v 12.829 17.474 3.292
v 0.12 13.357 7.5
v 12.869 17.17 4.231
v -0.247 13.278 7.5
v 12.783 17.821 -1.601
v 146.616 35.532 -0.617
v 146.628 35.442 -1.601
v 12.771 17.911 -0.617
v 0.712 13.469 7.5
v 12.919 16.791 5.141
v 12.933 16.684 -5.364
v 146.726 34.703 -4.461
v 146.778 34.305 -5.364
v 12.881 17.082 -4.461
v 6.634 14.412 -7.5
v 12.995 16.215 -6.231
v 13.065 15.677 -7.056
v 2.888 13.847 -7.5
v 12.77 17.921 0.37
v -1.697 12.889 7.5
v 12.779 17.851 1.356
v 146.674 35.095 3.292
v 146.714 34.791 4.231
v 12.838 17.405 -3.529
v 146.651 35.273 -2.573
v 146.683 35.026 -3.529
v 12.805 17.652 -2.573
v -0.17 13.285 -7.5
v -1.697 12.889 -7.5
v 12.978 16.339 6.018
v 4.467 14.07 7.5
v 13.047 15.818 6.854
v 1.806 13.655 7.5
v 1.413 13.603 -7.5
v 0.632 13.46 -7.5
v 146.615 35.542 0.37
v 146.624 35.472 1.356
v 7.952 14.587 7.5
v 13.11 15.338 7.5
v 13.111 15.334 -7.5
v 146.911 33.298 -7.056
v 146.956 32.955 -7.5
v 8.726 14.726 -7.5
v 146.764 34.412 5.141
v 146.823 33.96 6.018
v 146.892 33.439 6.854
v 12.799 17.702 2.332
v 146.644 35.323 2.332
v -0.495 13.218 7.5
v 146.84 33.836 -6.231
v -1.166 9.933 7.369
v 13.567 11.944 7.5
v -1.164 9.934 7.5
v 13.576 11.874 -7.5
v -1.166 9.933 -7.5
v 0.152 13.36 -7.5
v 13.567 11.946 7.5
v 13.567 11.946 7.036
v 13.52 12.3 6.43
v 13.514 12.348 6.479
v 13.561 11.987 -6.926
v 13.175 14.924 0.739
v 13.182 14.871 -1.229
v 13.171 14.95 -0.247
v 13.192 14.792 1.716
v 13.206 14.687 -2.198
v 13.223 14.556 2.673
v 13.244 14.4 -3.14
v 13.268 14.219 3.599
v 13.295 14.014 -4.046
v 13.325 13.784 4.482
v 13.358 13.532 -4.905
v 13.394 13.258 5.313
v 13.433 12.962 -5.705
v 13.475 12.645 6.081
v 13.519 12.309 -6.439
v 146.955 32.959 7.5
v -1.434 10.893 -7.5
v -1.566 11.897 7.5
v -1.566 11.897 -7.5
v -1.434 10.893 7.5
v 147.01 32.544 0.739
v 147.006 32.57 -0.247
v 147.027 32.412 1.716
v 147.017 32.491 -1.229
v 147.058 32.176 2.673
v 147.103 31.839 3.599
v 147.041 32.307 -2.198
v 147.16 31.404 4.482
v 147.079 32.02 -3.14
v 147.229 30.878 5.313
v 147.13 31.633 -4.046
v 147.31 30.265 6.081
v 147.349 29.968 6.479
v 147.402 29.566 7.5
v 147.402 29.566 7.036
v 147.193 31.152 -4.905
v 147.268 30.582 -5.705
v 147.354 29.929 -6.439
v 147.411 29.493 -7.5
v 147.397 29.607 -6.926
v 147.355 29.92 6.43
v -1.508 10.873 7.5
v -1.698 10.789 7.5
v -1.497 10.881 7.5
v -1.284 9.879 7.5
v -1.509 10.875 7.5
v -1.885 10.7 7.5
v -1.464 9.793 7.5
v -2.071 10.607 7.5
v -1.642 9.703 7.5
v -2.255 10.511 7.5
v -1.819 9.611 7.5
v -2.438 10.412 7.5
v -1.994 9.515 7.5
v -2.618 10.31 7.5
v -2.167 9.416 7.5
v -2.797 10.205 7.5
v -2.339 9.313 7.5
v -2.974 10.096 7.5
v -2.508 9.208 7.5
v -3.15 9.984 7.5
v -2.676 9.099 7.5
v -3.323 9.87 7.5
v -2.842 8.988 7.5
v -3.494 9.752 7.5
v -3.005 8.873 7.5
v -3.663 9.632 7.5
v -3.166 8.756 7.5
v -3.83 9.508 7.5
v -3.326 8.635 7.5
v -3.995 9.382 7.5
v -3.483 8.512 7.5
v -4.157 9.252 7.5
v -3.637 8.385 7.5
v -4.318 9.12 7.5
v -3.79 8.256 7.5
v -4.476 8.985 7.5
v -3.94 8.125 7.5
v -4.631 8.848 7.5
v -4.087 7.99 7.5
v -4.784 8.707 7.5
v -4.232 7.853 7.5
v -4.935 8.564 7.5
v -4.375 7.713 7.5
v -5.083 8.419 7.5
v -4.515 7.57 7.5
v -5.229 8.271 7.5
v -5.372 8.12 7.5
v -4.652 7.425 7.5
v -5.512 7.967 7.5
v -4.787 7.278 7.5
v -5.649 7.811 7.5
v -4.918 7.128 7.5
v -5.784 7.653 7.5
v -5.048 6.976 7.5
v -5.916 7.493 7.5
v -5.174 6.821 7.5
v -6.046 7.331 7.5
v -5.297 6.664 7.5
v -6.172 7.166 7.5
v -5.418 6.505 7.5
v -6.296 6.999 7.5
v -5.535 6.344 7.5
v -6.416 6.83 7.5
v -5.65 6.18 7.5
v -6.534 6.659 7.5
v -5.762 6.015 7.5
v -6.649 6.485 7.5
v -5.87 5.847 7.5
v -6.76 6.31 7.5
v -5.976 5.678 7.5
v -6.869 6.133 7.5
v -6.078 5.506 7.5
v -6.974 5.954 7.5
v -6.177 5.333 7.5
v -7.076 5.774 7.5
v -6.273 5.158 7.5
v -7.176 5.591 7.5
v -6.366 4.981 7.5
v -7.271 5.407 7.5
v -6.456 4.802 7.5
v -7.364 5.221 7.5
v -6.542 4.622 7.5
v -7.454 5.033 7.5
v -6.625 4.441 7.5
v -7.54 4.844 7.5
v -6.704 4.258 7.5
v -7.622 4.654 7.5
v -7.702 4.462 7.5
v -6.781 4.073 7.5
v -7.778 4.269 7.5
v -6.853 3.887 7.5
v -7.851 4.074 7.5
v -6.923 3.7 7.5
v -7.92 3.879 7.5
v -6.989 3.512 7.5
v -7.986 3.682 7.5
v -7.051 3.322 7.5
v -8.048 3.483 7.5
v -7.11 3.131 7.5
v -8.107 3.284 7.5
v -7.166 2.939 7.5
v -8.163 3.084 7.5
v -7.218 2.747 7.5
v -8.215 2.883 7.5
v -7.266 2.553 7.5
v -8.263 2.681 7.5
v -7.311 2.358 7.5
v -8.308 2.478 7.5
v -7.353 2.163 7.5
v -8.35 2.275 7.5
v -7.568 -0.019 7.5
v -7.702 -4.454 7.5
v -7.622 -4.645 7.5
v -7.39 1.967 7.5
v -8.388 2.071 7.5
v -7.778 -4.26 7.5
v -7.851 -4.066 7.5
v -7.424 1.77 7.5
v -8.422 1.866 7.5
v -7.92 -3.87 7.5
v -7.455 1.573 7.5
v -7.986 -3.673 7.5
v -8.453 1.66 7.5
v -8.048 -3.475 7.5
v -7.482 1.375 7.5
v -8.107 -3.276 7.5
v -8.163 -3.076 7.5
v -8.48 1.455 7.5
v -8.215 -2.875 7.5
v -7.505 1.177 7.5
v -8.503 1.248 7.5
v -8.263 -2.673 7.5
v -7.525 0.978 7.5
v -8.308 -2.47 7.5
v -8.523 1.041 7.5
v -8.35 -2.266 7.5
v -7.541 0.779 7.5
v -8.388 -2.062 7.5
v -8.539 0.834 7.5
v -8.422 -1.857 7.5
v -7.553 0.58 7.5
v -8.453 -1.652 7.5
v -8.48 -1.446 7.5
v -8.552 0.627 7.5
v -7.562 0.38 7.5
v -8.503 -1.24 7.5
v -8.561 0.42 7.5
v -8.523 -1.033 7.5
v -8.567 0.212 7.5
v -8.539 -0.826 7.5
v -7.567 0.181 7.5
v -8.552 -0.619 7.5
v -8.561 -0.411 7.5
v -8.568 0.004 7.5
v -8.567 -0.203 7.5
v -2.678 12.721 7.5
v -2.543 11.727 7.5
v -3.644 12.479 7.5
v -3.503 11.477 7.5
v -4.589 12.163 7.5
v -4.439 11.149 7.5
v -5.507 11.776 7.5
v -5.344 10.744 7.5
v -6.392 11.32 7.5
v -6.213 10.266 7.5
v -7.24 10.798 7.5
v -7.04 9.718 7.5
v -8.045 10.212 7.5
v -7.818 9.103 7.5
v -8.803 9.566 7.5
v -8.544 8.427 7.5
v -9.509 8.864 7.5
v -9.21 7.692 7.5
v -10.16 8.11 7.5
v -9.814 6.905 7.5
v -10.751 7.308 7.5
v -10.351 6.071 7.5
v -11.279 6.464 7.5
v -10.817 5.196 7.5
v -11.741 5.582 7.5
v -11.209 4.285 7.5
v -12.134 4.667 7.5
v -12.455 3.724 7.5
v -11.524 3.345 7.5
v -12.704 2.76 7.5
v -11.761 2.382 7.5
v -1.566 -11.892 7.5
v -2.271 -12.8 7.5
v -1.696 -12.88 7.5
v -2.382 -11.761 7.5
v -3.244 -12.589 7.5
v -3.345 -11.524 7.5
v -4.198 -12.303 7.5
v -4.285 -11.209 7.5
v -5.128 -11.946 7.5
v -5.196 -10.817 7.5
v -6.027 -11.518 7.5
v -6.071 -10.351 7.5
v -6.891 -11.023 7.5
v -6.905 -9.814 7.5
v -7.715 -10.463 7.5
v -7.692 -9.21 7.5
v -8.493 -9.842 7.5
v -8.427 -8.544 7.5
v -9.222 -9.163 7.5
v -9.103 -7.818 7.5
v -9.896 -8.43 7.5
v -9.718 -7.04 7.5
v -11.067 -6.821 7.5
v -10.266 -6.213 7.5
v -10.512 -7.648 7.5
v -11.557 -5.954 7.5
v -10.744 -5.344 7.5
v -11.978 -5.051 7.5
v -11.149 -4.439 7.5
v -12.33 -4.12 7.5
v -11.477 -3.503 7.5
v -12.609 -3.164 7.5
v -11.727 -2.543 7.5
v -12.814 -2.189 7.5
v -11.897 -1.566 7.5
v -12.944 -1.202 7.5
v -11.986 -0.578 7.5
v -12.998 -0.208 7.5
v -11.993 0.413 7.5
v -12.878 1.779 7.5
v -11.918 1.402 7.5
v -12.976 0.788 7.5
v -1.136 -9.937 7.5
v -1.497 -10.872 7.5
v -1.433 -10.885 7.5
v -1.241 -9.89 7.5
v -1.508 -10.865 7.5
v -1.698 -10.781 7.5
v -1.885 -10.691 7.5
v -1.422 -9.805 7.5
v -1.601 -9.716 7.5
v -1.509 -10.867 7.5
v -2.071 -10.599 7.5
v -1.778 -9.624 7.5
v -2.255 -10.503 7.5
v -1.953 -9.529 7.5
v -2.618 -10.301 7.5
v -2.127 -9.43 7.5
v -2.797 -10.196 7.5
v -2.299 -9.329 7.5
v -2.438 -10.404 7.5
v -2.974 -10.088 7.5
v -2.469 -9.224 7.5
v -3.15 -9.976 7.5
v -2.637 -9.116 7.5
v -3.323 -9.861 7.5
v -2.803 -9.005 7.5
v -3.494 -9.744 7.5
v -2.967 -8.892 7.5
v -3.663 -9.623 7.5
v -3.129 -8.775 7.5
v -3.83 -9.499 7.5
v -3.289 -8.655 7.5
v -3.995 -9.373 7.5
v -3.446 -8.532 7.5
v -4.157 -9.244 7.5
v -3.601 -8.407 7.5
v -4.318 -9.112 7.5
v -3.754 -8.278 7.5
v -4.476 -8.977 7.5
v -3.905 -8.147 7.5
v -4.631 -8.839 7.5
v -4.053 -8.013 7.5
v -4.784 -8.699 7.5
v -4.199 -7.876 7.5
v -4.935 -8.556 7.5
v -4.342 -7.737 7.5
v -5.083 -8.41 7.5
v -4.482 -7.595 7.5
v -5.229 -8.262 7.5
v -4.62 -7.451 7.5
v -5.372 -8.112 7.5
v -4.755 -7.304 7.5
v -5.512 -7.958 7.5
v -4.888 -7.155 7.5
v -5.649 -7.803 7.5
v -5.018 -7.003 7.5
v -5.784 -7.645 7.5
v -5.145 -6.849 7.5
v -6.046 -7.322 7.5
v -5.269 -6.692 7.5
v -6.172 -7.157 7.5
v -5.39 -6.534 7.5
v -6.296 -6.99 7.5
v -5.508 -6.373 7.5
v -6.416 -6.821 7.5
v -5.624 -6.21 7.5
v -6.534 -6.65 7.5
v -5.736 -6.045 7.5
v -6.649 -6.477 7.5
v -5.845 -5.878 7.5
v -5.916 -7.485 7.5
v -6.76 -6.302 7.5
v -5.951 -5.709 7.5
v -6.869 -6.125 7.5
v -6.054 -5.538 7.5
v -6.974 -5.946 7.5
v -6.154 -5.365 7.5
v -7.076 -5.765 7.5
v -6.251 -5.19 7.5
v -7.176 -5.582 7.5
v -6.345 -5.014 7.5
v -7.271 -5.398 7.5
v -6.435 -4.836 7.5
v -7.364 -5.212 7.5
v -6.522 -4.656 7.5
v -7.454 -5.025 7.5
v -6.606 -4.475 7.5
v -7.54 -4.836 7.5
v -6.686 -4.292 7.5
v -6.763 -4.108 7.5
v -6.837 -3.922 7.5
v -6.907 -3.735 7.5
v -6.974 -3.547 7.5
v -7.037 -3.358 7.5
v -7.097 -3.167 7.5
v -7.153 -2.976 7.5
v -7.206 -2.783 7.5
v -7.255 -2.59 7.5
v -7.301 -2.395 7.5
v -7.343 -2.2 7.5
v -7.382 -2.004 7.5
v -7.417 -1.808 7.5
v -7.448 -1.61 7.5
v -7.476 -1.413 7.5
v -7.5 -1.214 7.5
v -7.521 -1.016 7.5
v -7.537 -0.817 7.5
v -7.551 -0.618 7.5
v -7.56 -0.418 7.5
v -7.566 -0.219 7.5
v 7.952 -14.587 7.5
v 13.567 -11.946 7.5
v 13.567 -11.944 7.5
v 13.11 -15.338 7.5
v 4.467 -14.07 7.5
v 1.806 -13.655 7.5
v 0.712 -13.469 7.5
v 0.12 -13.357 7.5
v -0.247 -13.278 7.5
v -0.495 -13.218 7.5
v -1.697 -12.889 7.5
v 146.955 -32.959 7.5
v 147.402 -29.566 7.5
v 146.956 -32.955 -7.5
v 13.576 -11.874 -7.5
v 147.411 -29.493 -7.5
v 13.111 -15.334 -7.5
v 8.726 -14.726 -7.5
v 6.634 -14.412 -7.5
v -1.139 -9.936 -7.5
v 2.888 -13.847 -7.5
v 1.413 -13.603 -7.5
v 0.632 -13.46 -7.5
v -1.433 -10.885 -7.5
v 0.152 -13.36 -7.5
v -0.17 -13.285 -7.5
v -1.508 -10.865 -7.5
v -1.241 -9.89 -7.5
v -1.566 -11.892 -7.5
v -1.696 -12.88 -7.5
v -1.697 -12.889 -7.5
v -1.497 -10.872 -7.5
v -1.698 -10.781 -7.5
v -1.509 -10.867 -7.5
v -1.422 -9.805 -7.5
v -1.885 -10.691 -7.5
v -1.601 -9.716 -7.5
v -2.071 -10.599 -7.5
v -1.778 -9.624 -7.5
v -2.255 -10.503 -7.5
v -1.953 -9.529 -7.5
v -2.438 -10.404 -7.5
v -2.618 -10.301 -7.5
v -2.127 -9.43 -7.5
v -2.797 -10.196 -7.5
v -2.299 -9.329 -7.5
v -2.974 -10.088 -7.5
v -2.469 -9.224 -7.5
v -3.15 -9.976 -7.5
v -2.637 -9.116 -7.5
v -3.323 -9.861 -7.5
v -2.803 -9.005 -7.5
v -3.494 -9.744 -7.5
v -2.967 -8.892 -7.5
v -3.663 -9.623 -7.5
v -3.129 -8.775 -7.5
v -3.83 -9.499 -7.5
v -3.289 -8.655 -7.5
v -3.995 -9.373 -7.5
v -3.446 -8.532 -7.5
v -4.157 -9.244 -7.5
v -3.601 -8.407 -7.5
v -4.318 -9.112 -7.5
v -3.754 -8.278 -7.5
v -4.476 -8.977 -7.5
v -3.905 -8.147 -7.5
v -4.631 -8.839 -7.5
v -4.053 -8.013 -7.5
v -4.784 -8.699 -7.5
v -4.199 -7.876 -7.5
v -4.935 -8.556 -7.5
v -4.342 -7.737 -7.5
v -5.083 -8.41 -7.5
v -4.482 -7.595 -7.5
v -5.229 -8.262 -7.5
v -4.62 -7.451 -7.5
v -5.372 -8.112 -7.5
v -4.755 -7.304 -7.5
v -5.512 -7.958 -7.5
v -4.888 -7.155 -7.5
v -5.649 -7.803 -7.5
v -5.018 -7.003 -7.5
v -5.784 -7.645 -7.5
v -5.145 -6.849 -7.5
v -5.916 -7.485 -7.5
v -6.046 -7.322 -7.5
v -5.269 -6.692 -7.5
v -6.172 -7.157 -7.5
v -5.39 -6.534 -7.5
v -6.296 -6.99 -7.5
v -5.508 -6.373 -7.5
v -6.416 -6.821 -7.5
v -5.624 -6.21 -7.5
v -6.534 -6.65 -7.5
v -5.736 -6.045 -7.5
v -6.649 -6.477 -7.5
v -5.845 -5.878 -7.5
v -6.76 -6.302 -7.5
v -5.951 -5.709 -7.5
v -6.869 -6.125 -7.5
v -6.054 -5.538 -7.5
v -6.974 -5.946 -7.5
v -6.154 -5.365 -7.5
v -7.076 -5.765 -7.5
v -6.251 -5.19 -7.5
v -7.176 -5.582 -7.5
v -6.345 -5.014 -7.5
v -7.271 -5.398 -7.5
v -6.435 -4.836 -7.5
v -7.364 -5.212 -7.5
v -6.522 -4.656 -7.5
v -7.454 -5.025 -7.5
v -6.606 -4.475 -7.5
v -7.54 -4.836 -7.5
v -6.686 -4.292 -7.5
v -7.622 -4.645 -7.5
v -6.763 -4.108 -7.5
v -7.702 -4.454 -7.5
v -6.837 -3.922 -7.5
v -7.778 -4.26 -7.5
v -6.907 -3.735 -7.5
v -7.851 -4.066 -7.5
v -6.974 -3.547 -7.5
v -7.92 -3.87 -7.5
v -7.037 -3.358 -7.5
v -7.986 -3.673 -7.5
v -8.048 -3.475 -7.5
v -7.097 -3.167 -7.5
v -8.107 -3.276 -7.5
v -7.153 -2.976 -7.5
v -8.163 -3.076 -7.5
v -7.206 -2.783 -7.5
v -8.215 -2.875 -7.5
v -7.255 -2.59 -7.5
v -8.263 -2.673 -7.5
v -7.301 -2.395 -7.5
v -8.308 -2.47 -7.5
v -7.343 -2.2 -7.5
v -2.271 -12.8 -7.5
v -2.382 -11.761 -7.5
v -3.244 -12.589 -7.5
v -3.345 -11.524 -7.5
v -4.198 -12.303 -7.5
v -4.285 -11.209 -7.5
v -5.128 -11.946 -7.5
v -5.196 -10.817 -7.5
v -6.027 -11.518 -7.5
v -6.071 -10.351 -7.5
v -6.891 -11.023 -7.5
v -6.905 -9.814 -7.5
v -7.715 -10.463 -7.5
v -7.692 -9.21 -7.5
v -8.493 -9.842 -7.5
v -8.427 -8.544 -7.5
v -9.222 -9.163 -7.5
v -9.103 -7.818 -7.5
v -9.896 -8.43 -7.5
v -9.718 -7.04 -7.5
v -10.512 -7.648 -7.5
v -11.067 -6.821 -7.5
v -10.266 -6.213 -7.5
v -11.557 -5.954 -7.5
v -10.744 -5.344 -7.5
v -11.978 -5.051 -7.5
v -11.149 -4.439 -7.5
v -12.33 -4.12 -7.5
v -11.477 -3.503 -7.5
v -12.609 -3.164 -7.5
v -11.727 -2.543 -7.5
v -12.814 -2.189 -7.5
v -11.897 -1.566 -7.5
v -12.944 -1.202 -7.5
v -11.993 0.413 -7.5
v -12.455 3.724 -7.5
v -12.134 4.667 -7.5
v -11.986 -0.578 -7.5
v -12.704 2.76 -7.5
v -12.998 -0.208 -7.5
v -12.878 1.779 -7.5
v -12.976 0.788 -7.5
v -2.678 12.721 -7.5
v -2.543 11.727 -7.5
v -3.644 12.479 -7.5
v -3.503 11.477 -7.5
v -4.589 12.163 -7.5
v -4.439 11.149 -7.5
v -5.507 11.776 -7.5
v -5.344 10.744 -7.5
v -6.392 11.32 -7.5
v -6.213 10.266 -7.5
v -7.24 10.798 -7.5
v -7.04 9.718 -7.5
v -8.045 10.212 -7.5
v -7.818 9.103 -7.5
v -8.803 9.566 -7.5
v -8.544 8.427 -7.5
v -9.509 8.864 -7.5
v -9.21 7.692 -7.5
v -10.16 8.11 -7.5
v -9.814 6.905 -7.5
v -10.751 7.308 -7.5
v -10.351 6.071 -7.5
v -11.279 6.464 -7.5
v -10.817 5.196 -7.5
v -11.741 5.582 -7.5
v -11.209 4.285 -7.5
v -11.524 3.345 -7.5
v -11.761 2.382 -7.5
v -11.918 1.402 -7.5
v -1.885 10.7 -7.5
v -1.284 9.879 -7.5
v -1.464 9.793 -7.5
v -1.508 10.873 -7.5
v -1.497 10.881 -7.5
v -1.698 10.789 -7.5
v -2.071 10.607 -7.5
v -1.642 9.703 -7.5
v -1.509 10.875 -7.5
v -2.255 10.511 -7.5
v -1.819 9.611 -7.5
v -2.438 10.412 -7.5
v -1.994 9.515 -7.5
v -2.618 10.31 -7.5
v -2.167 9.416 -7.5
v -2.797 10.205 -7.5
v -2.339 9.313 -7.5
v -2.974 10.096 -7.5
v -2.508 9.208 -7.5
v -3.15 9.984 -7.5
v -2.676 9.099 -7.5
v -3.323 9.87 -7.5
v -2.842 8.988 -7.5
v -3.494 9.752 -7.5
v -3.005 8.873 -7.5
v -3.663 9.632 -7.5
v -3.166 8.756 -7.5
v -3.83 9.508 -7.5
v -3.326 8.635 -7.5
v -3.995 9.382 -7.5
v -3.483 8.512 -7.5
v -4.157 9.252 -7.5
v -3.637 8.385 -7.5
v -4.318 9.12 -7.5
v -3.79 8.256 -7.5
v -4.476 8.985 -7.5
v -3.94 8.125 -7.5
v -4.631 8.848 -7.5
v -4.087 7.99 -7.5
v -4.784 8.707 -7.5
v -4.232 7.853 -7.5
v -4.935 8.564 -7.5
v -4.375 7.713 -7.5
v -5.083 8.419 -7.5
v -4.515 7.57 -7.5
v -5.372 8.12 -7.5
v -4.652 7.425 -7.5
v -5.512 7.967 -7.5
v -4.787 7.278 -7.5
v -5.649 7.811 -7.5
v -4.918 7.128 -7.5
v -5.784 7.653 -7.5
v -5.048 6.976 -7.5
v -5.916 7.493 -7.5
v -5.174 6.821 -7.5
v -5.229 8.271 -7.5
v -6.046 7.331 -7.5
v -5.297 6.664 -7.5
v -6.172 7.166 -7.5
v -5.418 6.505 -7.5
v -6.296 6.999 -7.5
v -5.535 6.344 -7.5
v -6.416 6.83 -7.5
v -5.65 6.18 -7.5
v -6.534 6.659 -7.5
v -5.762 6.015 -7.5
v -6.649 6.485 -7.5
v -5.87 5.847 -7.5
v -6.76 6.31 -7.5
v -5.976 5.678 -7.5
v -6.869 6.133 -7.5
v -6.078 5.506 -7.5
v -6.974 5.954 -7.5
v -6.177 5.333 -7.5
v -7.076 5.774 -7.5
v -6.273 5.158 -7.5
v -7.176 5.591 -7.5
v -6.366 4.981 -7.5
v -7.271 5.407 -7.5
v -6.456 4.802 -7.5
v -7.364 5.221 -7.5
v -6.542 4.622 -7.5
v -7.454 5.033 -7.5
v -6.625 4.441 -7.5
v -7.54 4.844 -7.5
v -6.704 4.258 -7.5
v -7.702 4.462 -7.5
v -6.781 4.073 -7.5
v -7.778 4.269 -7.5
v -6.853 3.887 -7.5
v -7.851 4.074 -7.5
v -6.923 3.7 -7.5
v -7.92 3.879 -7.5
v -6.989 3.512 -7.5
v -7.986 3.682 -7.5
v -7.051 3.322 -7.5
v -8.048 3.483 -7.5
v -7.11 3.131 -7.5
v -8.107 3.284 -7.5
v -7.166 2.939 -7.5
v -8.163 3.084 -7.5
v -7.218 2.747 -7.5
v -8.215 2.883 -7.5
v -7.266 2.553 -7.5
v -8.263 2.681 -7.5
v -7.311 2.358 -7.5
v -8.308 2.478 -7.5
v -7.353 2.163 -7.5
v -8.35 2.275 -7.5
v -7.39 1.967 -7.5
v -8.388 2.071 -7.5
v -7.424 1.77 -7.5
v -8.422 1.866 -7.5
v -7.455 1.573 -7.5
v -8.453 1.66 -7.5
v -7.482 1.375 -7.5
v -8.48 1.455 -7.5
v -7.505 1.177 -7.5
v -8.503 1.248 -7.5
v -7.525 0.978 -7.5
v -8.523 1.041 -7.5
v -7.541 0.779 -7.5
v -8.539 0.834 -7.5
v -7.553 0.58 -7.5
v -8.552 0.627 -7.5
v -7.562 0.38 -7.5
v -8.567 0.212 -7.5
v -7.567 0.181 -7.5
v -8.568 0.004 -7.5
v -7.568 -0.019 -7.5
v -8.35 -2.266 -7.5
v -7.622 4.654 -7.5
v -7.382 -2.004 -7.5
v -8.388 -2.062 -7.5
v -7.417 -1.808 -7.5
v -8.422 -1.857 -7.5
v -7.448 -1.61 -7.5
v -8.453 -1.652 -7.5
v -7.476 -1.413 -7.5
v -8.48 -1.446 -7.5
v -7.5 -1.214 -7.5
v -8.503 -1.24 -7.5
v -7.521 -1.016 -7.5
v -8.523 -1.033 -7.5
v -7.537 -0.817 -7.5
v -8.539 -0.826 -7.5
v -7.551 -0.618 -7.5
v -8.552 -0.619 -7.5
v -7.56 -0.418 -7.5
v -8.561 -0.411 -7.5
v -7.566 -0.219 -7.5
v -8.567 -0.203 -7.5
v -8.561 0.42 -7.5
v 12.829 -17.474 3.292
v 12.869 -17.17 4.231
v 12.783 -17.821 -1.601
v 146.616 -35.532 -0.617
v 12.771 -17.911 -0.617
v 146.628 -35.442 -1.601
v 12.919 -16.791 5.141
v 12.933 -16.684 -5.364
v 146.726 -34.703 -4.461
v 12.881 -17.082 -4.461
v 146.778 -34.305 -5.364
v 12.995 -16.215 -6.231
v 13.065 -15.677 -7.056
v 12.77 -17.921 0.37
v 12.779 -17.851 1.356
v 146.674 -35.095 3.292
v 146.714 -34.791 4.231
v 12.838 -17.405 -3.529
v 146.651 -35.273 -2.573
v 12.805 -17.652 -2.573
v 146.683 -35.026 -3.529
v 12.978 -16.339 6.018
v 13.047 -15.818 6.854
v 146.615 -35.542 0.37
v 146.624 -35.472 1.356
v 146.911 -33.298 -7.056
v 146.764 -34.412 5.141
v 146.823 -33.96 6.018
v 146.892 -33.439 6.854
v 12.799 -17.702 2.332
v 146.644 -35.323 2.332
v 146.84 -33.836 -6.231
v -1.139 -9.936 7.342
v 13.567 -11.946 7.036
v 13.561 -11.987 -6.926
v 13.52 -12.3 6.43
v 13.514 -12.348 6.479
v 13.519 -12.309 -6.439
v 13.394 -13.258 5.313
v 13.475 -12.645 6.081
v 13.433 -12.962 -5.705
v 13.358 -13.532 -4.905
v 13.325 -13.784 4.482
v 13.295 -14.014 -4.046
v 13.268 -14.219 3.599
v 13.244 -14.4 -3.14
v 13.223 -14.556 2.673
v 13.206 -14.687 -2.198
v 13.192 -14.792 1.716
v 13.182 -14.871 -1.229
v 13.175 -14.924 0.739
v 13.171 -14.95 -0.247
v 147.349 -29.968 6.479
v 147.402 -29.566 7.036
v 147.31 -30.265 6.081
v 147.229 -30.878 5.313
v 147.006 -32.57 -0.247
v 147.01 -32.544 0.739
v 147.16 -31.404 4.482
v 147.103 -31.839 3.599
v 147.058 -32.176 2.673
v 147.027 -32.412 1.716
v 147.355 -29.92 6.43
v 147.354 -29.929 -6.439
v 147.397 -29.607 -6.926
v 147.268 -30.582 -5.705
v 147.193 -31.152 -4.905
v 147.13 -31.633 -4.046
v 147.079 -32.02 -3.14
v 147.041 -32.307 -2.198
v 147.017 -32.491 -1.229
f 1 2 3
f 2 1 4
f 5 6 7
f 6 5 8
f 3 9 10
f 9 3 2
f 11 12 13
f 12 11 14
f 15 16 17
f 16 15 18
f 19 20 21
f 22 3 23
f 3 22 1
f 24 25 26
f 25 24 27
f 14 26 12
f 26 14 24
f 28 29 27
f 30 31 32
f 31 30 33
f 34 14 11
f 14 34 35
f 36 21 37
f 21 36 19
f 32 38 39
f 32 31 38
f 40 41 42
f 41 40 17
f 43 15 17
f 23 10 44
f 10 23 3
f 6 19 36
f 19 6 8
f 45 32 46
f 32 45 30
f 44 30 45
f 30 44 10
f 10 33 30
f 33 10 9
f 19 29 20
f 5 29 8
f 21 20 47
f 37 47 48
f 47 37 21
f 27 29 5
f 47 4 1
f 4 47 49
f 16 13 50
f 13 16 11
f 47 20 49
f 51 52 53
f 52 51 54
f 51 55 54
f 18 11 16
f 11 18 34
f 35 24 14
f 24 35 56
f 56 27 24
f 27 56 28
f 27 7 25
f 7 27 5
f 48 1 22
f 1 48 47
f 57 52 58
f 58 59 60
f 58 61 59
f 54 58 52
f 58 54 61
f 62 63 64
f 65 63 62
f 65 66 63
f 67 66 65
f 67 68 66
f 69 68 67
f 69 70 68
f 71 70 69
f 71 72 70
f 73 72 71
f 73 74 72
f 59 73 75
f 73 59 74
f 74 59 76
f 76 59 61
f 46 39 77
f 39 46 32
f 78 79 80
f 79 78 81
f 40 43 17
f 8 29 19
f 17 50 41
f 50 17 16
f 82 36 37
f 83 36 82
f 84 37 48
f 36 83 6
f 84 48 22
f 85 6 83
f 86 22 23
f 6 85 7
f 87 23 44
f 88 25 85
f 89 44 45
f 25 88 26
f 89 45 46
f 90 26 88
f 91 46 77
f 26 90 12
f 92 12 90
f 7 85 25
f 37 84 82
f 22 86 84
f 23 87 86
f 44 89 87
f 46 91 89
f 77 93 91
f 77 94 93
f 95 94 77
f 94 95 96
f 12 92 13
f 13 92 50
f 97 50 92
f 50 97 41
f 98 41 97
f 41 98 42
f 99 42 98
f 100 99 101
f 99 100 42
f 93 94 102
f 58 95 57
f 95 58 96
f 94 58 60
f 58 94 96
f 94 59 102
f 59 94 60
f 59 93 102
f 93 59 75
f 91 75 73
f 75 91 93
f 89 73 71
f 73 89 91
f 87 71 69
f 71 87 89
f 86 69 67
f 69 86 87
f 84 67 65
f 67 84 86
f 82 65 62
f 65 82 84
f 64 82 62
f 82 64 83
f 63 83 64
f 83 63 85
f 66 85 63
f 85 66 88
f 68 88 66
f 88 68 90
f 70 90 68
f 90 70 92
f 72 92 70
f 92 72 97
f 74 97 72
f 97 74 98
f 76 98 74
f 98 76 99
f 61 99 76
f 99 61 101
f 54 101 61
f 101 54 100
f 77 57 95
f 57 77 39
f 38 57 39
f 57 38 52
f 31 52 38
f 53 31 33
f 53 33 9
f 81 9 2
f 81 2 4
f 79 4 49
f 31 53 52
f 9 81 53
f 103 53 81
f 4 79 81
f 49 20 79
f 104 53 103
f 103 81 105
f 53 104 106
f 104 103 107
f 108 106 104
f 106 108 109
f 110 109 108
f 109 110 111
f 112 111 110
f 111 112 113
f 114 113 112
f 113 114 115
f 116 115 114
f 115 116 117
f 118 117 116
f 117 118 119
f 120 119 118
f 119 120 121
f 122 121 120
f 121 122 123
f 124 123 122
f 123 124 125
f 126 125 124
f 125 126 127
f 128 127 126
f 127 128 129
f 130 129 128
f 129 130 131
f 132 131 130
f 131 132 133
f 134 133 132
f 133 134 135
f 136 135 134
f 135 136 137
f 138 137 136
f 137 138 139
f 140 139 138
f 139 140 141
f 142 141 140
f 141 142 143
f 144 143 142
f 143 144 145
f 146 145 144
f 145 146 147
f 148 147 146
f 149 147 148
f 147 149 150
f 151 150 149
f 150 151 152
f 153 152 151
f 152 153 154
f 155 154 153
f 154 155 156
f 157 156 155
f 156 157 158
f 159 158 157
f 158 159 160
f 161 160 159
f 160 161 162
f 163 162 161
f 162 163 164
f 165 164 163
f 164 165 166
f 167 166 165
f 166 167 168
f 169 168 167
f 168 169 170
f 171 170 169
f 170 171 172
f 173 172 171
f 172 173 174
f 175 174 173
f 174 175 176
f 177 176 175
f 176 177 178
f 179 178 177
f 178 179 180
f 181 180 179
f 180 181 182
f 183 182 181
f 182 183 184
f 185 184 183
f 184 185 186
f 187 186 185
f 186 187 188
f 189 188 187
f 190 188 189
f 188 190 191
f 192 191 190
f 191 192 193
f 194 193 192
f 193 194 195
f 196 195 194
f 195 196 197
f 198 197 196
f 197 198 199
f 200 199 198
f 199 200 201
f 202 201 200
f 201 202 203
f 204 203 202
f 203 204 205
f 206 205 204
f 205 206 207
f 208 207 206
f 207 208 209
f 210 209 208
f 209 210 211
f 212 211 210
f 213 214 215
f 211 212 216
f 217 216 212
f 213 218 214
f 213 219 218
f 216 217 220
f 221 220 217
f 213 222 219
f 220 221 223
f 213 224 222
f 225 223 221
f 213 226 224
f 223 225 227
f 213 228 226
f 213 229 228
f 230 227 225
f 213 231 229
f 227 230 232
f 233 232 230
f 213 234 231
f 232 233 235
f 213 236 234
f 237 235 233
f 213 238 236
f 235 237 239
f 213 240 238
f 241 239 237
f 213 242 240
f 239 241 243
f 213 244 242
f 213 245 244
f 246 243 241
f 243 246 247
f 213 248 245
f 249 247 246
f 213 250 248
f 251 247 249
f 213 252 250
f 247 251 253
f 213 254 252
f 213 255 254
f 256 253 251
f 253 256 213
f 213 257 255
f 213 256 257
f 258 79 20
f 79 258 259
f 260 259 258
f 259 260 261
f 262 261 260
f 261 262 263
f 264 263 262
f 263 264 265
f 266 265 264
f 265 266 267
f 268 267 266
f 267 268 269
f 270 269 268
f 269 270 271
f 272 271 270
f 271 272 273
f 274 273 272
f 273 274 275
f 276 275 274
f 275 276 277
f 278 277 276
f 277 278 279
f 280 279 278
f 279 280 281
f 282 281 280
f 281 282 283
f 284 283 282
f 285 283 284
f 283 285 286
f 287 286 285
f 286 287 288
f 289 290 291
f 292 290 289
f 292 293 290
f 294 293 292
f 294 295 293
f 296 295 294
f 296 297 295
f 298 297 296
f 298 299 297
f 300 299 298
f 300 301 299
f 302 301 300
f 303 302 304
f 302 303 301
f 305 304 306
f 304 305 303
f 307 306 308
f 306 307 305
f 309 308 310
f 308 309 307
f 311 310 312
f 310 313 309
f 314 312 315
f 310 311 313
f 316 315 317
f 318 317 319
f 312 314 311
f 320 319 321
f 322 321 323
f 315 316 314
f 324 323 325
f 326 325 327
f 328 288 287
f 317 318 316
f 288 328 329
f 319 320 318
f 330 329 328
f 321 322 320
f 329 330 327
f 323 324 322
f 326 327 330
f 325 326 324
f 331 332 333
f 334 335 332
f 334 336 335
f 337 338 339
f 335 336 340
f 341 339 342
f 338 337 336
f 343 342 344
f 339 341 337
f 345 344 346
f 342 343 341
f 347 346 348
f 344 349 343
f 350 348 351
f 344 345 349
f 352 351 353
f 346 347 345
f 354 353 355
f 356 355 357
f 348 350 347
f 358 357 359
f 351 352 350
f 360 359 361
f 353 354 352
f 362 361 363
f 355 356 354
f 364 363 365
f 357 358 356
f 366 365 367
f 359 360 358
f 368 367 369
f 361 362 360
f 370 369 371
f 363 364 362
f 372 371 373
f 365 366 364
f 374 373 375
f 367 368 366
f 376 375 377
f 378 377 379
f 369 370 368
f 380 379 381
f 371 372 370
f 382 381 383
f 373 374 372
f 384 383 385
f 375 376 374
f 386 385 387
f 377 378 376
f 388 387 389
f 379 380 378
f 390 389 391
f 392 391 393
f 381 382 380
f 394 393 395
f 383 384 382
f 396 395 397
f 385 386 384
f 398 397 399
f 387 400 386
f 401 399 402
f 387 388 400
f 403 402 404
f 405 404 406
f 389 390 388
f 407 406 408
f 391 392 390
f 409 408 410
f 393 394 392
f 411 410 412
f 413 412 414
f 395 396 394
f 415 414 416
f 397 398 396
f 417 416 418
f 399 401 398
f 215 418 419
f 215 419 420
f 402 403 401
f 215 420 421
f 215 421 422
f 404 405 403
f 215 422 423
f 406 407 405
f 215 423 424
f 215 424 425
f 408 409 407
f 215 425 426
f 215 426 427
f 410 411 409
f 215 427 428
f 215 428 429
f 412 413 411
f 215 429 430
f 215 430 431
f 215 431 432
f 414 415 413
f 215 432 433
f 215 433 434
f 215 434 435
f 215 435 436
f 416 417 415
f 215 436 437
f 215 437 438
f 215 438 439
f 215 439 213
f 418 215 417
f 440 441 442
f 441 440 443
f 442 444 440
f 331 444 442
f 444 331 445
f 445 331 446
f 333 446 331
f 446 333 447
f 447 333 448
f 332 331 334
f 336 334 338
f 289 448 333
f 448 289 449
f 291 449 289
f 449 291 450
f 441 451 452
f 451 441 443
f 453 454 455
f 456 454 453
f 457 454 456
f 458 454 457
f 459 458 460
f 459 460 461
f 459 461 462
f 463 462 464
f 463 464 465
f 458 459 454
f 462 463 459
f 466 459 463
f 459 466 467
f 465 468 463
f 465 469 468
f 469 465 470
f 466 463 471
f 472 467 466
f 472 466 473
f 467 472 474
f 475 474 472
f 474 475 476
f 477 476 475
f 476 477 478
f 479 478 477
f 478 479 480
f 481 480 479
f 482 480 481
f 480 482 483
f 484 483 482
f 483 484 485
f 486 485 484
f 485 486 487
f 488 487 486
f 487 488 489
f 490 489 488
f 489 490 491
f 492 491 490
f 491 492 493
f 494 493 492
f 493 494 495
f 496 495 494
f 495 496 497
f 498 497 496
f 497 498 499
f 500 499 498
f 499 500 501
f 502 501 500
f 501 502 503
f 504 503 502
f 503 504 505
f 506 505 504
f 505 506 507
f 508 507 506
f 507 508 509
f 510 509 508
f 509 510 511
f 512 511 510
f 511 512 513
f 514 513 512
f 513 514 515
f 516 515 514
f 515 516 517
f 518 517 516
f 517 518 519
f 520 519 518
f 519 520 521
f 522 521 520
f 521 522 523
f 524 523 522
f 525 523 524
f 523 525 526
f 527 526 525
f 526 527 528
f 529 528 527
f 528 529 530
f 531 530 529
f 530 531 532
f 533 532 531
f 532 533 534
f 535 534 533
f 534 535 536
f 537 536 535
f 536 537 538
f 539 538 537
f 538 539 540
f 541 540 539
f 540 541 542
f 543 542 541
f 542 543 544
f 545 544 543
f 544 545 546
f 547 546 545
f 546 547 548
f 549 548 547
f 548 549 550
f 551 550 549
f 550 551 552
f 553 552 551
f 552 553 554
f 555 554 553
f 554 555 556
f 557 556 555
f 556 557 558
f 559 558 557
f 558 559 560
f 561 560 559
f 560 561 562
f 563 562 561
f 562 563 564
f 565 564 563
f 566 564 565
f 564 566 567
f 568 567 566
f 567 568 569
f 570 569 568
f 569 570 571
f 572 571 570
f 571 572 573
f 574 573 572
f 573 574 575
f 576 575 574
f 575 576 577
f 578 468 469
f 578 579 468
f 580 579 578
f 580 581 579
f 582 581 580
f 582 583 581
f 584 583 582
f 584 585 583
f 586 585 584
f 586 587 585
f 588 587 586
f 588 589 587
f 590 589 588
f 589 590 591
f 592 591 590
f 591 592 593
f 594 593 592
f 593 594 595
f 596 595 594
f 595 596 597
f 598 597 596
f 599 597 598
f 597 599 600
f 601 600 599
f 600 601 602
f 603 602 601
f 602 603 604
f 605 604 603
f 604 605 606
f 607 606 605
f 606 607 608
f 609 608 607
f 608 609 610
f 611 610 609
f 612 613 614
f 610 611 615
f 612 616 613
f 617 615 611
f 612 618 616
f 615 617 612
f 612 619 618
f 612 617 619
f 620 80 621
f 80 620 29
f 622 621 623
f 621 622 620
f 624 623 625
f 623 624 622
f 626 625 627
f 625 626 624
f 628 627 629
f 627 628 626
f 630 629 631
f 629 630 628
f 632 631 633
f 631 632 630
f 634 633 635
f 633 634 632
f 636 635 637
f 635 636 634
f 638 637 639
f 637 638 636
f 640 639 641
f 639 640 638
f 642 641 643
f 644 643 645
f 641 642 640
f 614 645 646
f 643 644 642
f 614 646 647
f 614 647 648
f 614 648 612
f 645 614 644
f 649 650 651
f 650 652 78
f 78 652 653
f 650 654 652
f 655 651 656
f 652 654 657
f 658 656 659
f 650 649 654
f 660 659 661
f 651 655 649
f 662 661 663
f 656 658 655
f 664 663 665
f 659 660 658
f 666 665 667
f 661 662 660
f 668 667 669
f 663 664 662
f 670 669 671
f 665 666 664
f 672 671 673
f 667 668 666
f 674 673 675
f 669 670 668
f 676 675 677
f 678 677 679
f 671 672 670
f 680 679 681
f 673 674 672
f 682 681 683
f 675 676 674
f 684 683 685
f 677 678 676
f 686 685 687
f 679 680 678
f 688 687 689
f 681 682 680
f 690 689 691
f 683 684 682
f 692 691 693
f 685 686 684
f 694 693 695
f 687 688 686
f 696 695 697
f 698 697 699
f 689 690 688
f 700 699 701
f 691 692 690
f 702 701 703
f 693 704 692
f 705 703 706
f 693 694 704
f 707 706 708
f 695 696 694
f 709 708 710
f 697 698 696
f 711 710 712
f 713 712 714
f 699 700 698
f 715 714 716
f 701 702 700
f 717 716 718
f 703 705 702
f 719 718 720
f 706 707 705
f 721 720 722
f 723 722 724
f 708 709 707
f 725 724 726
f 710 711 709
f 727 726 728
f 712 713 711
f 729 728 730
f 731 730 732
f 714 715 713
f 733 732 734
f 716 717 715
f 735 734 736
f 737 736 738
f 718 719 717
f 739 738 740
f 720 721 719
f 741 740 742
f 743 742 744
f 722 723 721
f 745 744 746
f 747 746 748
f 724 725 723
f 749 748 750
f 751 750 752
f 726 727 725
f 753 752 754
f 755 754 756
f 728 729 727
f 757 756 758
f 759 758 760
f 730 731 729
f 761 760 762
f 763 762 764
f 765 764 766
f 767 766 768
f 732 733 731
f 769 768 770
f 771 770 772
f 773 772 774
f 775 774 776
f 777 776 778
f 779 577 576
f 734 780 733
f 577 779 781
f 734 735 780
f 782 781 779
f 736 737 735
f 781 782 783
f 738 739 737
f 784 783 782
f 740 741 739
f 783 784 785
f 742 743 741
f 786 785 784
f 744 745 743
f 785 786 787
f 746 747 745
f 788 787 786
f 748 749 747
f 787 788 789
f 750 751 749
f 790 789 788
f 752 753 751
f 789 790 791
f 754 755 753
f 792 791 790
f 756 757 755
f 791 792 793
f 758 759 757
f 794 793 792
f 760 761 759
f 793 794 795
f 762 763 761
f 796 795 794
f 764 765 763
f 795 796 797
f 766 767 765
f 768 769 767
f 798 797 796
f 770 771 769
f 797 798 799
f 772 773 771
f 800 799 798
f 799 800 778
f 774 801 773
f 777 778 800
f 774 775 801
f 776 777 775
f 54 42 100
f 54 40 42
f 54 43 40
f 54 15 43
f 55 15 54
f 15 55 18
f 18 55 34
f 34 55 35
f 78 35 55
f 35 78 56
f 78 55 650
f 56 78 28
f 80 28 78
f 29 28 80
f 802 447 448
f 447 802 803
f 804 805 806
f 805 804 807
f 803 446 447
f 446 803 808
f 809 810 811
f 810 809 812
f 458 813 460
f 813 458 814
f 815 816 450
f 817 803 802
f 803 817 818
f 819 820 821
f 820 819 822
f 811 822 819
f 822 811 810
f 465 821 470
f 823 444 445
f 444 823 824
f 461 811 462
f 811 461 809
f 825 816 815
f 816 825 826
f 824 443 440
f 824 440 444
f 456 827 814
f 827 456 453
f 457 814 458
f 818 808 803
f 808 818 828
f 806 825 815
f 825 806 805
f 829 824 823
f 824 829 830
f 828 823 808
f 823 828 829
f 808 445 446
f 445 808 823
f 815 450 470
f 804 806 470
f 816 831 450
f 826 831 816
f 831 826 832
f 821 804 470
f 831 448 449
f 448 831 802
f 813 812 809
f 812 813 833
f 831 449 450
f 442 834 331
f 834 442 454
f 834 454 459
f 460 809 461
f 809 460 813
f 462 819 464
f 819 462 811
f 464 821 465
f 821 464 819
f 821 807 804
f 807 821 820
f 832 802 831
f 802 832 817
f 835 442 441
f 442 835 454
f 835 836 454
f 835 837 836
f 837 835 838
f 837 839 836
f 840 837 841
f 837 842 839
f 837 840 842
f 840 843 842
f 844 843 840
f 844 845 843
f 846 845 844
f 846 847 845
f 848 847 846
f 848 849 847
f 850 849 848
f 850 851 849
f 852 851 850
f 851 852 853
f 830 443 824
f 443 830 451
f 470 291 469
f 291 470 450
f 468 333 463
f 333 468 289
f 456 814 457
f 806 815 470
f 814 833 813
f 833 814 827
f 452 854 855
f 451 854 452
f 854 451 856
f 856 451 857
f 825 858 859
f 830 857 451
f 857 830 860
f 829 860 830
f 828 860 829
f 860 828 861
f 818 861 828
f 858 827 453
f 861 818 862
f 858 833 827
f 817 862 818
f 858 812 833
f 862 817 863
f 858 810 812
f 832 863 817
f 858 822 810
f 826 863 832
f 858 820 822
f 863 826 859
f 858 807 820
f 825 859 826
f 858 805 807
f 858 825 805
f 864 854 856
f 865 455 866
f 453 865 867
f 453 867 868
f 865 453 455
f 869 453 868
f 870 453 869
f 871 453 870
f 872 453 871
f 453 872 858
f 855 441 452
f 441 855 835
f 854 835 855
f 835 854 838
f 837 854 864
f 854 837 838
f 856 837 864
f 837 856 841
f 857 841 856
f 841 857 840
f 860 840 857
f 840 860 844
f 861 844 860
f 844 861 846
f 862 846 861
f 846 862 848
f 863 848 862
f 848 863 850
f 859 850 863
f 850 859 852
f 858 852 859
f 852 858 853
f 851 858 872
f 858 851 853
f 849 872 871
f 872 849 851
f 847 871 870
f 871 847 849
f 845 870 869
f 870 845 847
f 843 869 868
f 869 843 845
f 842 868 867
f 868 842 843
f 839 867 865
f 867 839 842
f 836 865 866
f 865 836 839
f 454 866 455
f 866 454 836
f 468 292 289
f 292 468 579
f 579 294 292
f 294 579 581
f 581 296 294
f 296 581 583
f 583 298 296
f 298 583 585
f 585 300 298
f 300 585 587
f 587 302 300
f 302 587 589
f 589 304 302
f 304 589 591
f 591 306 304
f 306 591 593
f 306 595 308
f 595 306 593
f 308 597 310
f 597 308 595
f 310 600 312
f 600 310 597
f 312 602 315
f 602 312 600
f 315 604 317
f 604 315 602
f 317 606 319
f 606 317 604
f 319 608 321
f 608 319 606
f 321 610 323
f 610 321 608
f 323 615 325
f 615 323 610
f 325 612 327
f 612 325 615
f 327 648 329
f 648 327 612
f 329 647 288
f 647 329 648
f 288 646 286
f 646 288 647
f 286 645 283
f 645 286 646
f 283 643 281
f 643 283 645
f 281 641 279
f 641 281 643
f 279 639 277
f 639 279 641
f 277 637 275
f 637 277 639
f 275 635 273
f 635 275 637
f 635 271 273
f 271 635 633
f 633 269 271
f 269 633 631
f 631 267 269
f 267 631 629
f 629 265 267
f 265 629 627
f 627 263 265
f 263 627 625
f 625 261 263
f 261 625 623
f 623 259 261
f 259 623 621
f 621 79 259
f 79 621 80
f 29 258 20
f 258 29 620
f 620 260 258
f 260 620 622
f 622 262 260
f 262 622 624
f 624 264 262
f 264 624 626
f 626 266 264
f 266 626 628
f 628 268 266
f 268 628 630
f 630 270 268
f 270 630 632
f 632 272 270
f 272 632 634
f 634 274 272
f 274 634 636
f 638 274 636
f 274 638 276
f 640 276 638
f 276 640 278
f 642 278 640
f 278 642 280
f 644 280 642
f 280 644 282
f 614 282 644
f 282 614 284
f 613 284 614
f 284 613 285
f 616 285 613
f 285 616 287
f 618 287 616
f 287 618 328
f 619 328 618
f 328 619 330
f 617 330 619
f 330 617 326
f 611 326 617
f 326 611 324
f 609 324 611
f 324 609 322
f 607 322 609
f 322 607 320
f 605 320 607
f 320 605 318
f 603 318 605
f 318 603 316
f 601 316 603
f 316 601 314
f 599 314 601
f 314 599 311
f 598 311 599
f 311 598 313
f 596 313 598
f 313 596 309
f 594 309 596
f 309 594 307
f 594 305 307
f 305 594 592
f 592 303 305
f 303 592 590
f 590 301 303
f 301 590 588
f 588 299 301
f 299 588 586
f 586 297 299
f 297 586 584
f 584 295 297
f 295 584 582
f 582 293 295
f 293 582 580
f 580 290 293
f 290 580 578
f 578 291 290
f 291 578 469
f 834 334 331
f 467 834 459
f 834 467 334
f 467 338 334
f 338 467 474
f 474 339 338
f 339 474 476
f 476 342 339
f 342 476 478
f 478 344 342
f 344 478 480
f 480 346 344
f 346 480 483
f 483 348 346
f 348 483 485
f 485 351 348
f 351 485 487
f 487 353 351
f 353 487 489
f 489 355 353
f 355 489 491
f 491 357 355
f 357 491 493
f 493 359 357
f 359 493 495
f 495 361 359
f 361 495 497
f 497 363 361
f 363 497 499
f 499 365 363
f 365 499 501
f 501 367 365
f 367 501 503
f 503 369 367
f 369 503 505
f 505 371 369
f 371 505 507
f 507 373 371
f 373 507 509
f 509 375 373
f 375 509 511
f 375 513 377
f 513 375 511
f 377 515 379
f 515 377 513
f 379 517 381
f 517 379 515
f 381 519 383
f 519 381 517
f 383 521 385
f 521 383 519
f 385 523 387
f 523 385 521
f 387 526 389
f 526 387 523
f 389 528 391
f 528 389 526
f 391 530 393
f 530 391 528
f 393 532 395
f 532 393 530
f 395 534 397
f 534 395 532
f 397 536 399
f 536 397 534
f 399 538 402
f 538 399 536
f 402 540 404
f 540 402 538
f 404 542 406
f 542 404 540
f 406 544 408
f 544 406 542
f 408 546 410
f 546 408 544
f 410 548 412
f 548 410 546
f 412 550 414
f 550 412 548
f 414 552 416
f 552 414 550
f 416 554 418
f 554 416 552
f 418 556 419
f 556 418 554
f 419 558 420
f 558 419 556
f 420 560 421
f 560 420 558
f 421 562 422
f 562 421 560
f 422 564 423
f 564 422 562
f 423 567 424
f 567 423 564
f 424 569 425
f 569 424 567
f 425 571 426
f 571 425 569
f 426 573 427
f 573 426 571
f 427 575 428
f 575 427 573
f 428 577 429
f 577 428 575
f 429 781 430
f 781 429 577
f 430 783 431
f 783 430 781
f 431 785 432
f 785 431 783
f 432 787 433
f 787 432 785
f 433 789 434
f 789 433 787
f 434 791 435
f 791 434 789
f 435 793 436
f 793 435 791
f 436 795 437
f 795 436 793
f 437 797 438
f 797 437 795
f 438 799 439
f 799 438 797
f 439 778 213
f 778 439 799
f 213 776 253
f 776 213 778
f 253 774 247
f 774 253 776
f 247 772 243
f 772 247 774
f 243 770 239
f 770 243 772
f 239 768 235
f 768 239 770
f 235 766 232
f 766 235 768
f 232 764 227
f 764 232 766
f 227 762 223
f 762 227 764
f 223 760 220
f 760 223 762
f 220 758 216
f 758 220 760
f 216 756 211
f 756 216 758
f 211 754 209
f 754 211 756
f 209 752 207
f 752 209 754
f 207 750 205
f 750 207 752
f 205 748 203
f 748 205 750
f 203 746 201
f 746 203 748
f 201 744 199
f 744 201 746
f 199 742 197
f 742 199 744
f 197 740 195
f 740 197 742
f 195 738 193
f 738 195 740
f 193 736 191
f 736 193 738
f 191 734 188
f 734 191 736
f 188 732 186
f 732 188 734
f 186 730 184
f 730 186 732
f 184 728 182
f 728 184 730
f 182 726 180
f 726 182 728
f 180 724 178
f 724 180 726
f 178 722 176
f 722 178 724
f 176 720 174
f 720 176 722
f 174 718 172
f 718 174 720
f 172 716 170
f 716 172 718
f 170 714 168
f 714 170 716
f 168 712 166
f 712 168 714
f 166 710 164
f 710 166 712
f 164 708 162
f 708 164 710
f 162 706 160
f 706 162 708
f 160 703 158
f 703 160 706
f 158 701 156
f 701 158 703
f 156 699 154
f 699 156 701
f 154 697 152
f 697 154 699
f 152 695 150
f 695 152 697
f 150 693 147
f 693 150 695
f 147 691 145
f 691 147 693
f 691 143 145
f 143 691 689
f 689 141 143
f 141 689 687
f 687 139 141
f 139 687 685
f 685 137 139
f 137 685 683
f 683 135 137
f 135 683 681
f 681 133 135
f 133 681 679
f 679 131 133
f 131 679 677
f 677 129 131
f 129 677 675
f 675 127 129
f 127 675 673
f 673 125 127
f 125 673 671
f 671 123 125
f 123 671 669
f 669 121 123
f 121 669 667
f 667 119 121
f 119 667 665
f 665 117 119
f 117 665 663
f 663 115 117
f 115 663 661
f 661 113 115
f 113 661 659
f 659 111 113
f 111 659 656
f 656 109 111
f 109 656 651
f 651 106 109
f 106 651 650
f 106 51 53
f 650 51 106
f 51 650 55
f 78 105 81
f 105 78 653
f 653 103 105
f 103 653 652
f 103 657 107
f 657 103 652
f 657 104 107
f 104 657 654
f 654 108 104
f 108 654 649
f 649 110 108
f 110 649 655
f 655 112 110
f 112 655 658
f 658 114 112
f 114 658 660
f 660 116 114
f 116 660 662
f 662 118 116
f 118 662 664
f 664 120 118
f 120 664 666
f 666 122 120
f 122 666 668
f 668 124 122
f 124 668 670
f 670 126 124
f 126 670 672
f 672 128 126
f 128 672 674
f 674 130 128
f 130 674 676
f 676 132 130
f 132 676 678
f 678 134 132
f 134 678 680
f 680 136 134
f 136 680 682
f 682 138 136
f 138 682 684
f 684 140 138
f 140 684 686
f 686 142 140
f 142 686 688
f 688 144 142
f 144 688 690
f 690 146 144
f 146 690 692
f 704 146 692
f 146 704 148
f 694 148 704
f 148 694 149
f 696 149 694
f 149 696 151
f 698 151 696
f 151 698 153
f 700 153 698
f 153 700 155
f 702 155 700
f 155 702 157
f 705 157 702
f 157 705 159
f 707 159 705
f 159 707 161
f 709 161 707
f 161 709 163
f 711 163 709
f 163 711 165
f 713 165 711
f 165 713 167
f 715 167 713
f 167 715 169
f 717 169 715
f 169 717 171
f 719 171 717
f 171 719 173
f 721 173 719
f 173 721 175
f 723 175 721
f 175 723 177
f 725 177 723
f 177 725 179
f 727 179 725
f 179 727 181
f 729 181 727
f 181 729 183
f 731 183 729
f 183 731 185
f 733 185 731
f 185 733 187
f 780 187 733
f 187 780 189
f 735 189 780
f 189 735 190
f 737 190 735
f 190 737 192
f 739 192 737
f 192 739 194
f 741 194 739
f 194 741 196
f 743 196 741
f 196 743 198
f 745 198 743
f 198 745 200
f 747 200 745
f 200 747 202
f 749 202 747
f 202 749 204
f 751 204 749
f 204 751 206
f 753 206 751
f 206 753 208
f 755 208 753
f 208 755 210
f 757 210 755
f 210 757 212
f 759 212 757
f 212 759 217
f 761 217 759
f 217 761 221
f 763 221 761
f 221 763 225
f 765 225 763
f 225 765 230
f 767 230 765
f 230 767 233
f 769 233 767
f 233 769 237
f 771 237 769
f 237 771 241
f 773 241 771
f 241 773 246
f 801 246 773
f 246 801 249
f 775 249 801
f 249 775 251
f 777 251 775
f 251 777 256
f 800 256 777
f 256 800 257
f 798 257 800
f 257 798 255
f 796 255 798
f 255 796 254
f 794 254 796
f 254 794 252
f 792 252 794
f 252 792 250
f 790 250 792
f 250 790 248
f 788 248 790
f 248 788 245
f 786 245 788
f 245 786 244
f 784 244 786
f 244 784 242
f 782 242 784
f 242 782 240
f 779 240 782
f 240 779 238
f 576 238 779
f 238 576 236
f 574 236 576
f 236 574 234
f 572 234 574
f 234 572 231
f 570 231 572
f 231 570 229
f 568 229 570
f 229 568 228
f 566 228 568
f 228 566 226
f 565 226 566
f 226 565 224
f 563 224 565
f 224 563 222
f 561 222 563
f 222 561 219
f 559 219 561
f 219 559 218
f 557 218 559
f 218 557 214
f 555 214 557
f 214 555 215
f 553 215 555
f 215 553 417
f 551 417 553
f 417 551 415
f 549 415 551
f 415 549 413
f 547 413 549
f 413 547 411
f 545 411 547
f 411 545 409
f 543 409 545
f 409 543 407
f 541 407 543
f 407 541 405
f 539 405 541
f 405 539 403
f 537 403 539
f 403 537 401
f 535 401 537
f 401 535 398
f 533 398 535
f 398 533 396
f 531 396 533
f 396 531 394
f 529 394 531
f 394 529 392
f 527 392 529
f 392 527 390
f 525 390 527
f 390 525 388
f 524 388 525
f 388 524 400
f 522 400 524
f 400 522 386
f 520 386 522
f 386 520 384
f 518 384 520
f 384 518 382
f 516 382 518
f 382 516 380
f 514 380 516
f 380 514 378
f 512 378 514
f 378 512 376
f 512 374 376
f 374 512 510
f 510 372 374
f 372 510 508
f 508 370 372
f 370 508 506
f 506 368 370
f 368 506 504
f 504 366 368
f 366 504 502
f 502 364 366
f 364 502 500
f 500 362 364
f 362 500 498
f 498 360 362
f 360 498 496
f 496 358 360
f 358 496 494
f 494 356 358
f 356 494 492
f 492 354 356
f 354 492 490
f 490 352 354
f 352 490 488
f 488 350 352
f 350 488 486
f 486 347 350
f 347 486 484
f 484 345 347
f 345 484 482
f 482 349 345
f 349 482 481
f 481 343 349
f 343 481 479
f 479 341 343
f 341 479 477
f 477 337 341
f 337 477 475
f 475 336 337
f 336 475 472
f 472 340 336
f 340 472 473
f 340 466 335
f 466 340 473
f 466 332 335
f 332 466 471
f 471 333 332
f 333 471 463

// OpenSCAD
// file: ../lib/arc.scad
/*
r: radius
b: thickness
t: theta
*/
module arc(r,b,t){
	//$fs=b*.2;
	a=(r+b)*2;
	rot=function(t)[cos(t)*a,sin(t)*a];
	intersection(){
		difference(){circle(r+b/2);circle(r-b/2);}
		polygon([
			for(i=[0:floor(abs(t)/120)])rot(120*i*sign(t)),
			rot(t),[0,0]
		]);
	}
}

// distance arc
module darc(d,b,t,center,cap){
	//$fs=b*.2;
	r=sqrt(d*d/(2*(1-cos(t))));
	translate([center?-d/2:0,0]){
		if(r!=1/0)translate([d,0])rotate((180-abs(t))/2*sign(t))translate([-r,0])arc(r,b,t);
		else translate([0,-b/2])square([d,b]);
			if(cap){
			circle(d=b);
			translate([d,0])circle(d=b,$fs=b*.2);
		}
	}
}
// main file
use <../lib/arc.scad>;
$fa=1;$fs=1;

width=15;
thick=3;
length=150;

dist=10;
theta=15;
h_thick=1;
inner_theta_p=.8;

tooth=5;
phi=45;
tooth_n=5;

module bone(t=thick){
	if(0)
	rotate([-90,0,0])scale([1,1,sign(t)])linear_extrude(abs(t)){
		translate([0,-width/2])square([length-width,width]);
		translate([length-width,0])circle(width/2);
	}else{
		intersection(){
			translate([0,0,-width/2])cube([length,width,width]);
		rotate([0,90,0]){
			union(){
				hull(){
					translate([0,thick/2,width])linear_extrude(.01)darc(width,t,90,center=true,cap=true);
					translate([0,thick/2,0])linear_extrude(.01)darc(width,t,0,center=true,cap=true);
				}
				translate([0,0,width])linear_extrude(length-width)translate([0,thick/2])darc(width,t,90,center=true,cap=true);
			}
		}
		}
	}
}

module half(){
	rotate([0,0,theta/2])translate([0,dist,0]){
		bone();
		/*
		intersection(){
			bone(-dist);
			translate([length-width,0,0])rotate([0,phi,0])for(i=[0:tooth_n-1])translate([-i*tooth,0,0])rotate([0,0,45])cube([tooth*sqrt(2)/2,tooth*sqrt(2)/2,100],center=true);
		}
		intersection(){
			bone(thick+tooth);
			translate([length/2,0,0])rotate([0,phi,0])for(i=[0:tooth_n-1])translate([-i*tooth,thick,0])rotate([0,0,45])cylinder(d=tooth/2,h=100,center=true);
		}
		*/
	}
}
module hinge(){
	translate([0,0,-width/2])linear_extrude(width){
		//rotate(90+theta/2)arc(dist+h_thick/2,h_thick,180-theta);
		translate([-sin(theta/2)*dist,-cos(theta/2)*(dist+h_thick/2),0])rotate(90){
			$fs=h_thick*.2;
			darc(dist*cos(theta/2)*2+h_thick,h_thick,(180-theta)*inner_theta_p);
			circle(d=h_thick);
			translate([dist*cos(theta/2)*2+h_thick,0])circle(d=h_thick);
		}
		rotate(90+theta/2)arc(dist+thick-h_thick/2,h_thick,180-theta);
	}
}


half();scale([1,-1,1])half();
hinge();
